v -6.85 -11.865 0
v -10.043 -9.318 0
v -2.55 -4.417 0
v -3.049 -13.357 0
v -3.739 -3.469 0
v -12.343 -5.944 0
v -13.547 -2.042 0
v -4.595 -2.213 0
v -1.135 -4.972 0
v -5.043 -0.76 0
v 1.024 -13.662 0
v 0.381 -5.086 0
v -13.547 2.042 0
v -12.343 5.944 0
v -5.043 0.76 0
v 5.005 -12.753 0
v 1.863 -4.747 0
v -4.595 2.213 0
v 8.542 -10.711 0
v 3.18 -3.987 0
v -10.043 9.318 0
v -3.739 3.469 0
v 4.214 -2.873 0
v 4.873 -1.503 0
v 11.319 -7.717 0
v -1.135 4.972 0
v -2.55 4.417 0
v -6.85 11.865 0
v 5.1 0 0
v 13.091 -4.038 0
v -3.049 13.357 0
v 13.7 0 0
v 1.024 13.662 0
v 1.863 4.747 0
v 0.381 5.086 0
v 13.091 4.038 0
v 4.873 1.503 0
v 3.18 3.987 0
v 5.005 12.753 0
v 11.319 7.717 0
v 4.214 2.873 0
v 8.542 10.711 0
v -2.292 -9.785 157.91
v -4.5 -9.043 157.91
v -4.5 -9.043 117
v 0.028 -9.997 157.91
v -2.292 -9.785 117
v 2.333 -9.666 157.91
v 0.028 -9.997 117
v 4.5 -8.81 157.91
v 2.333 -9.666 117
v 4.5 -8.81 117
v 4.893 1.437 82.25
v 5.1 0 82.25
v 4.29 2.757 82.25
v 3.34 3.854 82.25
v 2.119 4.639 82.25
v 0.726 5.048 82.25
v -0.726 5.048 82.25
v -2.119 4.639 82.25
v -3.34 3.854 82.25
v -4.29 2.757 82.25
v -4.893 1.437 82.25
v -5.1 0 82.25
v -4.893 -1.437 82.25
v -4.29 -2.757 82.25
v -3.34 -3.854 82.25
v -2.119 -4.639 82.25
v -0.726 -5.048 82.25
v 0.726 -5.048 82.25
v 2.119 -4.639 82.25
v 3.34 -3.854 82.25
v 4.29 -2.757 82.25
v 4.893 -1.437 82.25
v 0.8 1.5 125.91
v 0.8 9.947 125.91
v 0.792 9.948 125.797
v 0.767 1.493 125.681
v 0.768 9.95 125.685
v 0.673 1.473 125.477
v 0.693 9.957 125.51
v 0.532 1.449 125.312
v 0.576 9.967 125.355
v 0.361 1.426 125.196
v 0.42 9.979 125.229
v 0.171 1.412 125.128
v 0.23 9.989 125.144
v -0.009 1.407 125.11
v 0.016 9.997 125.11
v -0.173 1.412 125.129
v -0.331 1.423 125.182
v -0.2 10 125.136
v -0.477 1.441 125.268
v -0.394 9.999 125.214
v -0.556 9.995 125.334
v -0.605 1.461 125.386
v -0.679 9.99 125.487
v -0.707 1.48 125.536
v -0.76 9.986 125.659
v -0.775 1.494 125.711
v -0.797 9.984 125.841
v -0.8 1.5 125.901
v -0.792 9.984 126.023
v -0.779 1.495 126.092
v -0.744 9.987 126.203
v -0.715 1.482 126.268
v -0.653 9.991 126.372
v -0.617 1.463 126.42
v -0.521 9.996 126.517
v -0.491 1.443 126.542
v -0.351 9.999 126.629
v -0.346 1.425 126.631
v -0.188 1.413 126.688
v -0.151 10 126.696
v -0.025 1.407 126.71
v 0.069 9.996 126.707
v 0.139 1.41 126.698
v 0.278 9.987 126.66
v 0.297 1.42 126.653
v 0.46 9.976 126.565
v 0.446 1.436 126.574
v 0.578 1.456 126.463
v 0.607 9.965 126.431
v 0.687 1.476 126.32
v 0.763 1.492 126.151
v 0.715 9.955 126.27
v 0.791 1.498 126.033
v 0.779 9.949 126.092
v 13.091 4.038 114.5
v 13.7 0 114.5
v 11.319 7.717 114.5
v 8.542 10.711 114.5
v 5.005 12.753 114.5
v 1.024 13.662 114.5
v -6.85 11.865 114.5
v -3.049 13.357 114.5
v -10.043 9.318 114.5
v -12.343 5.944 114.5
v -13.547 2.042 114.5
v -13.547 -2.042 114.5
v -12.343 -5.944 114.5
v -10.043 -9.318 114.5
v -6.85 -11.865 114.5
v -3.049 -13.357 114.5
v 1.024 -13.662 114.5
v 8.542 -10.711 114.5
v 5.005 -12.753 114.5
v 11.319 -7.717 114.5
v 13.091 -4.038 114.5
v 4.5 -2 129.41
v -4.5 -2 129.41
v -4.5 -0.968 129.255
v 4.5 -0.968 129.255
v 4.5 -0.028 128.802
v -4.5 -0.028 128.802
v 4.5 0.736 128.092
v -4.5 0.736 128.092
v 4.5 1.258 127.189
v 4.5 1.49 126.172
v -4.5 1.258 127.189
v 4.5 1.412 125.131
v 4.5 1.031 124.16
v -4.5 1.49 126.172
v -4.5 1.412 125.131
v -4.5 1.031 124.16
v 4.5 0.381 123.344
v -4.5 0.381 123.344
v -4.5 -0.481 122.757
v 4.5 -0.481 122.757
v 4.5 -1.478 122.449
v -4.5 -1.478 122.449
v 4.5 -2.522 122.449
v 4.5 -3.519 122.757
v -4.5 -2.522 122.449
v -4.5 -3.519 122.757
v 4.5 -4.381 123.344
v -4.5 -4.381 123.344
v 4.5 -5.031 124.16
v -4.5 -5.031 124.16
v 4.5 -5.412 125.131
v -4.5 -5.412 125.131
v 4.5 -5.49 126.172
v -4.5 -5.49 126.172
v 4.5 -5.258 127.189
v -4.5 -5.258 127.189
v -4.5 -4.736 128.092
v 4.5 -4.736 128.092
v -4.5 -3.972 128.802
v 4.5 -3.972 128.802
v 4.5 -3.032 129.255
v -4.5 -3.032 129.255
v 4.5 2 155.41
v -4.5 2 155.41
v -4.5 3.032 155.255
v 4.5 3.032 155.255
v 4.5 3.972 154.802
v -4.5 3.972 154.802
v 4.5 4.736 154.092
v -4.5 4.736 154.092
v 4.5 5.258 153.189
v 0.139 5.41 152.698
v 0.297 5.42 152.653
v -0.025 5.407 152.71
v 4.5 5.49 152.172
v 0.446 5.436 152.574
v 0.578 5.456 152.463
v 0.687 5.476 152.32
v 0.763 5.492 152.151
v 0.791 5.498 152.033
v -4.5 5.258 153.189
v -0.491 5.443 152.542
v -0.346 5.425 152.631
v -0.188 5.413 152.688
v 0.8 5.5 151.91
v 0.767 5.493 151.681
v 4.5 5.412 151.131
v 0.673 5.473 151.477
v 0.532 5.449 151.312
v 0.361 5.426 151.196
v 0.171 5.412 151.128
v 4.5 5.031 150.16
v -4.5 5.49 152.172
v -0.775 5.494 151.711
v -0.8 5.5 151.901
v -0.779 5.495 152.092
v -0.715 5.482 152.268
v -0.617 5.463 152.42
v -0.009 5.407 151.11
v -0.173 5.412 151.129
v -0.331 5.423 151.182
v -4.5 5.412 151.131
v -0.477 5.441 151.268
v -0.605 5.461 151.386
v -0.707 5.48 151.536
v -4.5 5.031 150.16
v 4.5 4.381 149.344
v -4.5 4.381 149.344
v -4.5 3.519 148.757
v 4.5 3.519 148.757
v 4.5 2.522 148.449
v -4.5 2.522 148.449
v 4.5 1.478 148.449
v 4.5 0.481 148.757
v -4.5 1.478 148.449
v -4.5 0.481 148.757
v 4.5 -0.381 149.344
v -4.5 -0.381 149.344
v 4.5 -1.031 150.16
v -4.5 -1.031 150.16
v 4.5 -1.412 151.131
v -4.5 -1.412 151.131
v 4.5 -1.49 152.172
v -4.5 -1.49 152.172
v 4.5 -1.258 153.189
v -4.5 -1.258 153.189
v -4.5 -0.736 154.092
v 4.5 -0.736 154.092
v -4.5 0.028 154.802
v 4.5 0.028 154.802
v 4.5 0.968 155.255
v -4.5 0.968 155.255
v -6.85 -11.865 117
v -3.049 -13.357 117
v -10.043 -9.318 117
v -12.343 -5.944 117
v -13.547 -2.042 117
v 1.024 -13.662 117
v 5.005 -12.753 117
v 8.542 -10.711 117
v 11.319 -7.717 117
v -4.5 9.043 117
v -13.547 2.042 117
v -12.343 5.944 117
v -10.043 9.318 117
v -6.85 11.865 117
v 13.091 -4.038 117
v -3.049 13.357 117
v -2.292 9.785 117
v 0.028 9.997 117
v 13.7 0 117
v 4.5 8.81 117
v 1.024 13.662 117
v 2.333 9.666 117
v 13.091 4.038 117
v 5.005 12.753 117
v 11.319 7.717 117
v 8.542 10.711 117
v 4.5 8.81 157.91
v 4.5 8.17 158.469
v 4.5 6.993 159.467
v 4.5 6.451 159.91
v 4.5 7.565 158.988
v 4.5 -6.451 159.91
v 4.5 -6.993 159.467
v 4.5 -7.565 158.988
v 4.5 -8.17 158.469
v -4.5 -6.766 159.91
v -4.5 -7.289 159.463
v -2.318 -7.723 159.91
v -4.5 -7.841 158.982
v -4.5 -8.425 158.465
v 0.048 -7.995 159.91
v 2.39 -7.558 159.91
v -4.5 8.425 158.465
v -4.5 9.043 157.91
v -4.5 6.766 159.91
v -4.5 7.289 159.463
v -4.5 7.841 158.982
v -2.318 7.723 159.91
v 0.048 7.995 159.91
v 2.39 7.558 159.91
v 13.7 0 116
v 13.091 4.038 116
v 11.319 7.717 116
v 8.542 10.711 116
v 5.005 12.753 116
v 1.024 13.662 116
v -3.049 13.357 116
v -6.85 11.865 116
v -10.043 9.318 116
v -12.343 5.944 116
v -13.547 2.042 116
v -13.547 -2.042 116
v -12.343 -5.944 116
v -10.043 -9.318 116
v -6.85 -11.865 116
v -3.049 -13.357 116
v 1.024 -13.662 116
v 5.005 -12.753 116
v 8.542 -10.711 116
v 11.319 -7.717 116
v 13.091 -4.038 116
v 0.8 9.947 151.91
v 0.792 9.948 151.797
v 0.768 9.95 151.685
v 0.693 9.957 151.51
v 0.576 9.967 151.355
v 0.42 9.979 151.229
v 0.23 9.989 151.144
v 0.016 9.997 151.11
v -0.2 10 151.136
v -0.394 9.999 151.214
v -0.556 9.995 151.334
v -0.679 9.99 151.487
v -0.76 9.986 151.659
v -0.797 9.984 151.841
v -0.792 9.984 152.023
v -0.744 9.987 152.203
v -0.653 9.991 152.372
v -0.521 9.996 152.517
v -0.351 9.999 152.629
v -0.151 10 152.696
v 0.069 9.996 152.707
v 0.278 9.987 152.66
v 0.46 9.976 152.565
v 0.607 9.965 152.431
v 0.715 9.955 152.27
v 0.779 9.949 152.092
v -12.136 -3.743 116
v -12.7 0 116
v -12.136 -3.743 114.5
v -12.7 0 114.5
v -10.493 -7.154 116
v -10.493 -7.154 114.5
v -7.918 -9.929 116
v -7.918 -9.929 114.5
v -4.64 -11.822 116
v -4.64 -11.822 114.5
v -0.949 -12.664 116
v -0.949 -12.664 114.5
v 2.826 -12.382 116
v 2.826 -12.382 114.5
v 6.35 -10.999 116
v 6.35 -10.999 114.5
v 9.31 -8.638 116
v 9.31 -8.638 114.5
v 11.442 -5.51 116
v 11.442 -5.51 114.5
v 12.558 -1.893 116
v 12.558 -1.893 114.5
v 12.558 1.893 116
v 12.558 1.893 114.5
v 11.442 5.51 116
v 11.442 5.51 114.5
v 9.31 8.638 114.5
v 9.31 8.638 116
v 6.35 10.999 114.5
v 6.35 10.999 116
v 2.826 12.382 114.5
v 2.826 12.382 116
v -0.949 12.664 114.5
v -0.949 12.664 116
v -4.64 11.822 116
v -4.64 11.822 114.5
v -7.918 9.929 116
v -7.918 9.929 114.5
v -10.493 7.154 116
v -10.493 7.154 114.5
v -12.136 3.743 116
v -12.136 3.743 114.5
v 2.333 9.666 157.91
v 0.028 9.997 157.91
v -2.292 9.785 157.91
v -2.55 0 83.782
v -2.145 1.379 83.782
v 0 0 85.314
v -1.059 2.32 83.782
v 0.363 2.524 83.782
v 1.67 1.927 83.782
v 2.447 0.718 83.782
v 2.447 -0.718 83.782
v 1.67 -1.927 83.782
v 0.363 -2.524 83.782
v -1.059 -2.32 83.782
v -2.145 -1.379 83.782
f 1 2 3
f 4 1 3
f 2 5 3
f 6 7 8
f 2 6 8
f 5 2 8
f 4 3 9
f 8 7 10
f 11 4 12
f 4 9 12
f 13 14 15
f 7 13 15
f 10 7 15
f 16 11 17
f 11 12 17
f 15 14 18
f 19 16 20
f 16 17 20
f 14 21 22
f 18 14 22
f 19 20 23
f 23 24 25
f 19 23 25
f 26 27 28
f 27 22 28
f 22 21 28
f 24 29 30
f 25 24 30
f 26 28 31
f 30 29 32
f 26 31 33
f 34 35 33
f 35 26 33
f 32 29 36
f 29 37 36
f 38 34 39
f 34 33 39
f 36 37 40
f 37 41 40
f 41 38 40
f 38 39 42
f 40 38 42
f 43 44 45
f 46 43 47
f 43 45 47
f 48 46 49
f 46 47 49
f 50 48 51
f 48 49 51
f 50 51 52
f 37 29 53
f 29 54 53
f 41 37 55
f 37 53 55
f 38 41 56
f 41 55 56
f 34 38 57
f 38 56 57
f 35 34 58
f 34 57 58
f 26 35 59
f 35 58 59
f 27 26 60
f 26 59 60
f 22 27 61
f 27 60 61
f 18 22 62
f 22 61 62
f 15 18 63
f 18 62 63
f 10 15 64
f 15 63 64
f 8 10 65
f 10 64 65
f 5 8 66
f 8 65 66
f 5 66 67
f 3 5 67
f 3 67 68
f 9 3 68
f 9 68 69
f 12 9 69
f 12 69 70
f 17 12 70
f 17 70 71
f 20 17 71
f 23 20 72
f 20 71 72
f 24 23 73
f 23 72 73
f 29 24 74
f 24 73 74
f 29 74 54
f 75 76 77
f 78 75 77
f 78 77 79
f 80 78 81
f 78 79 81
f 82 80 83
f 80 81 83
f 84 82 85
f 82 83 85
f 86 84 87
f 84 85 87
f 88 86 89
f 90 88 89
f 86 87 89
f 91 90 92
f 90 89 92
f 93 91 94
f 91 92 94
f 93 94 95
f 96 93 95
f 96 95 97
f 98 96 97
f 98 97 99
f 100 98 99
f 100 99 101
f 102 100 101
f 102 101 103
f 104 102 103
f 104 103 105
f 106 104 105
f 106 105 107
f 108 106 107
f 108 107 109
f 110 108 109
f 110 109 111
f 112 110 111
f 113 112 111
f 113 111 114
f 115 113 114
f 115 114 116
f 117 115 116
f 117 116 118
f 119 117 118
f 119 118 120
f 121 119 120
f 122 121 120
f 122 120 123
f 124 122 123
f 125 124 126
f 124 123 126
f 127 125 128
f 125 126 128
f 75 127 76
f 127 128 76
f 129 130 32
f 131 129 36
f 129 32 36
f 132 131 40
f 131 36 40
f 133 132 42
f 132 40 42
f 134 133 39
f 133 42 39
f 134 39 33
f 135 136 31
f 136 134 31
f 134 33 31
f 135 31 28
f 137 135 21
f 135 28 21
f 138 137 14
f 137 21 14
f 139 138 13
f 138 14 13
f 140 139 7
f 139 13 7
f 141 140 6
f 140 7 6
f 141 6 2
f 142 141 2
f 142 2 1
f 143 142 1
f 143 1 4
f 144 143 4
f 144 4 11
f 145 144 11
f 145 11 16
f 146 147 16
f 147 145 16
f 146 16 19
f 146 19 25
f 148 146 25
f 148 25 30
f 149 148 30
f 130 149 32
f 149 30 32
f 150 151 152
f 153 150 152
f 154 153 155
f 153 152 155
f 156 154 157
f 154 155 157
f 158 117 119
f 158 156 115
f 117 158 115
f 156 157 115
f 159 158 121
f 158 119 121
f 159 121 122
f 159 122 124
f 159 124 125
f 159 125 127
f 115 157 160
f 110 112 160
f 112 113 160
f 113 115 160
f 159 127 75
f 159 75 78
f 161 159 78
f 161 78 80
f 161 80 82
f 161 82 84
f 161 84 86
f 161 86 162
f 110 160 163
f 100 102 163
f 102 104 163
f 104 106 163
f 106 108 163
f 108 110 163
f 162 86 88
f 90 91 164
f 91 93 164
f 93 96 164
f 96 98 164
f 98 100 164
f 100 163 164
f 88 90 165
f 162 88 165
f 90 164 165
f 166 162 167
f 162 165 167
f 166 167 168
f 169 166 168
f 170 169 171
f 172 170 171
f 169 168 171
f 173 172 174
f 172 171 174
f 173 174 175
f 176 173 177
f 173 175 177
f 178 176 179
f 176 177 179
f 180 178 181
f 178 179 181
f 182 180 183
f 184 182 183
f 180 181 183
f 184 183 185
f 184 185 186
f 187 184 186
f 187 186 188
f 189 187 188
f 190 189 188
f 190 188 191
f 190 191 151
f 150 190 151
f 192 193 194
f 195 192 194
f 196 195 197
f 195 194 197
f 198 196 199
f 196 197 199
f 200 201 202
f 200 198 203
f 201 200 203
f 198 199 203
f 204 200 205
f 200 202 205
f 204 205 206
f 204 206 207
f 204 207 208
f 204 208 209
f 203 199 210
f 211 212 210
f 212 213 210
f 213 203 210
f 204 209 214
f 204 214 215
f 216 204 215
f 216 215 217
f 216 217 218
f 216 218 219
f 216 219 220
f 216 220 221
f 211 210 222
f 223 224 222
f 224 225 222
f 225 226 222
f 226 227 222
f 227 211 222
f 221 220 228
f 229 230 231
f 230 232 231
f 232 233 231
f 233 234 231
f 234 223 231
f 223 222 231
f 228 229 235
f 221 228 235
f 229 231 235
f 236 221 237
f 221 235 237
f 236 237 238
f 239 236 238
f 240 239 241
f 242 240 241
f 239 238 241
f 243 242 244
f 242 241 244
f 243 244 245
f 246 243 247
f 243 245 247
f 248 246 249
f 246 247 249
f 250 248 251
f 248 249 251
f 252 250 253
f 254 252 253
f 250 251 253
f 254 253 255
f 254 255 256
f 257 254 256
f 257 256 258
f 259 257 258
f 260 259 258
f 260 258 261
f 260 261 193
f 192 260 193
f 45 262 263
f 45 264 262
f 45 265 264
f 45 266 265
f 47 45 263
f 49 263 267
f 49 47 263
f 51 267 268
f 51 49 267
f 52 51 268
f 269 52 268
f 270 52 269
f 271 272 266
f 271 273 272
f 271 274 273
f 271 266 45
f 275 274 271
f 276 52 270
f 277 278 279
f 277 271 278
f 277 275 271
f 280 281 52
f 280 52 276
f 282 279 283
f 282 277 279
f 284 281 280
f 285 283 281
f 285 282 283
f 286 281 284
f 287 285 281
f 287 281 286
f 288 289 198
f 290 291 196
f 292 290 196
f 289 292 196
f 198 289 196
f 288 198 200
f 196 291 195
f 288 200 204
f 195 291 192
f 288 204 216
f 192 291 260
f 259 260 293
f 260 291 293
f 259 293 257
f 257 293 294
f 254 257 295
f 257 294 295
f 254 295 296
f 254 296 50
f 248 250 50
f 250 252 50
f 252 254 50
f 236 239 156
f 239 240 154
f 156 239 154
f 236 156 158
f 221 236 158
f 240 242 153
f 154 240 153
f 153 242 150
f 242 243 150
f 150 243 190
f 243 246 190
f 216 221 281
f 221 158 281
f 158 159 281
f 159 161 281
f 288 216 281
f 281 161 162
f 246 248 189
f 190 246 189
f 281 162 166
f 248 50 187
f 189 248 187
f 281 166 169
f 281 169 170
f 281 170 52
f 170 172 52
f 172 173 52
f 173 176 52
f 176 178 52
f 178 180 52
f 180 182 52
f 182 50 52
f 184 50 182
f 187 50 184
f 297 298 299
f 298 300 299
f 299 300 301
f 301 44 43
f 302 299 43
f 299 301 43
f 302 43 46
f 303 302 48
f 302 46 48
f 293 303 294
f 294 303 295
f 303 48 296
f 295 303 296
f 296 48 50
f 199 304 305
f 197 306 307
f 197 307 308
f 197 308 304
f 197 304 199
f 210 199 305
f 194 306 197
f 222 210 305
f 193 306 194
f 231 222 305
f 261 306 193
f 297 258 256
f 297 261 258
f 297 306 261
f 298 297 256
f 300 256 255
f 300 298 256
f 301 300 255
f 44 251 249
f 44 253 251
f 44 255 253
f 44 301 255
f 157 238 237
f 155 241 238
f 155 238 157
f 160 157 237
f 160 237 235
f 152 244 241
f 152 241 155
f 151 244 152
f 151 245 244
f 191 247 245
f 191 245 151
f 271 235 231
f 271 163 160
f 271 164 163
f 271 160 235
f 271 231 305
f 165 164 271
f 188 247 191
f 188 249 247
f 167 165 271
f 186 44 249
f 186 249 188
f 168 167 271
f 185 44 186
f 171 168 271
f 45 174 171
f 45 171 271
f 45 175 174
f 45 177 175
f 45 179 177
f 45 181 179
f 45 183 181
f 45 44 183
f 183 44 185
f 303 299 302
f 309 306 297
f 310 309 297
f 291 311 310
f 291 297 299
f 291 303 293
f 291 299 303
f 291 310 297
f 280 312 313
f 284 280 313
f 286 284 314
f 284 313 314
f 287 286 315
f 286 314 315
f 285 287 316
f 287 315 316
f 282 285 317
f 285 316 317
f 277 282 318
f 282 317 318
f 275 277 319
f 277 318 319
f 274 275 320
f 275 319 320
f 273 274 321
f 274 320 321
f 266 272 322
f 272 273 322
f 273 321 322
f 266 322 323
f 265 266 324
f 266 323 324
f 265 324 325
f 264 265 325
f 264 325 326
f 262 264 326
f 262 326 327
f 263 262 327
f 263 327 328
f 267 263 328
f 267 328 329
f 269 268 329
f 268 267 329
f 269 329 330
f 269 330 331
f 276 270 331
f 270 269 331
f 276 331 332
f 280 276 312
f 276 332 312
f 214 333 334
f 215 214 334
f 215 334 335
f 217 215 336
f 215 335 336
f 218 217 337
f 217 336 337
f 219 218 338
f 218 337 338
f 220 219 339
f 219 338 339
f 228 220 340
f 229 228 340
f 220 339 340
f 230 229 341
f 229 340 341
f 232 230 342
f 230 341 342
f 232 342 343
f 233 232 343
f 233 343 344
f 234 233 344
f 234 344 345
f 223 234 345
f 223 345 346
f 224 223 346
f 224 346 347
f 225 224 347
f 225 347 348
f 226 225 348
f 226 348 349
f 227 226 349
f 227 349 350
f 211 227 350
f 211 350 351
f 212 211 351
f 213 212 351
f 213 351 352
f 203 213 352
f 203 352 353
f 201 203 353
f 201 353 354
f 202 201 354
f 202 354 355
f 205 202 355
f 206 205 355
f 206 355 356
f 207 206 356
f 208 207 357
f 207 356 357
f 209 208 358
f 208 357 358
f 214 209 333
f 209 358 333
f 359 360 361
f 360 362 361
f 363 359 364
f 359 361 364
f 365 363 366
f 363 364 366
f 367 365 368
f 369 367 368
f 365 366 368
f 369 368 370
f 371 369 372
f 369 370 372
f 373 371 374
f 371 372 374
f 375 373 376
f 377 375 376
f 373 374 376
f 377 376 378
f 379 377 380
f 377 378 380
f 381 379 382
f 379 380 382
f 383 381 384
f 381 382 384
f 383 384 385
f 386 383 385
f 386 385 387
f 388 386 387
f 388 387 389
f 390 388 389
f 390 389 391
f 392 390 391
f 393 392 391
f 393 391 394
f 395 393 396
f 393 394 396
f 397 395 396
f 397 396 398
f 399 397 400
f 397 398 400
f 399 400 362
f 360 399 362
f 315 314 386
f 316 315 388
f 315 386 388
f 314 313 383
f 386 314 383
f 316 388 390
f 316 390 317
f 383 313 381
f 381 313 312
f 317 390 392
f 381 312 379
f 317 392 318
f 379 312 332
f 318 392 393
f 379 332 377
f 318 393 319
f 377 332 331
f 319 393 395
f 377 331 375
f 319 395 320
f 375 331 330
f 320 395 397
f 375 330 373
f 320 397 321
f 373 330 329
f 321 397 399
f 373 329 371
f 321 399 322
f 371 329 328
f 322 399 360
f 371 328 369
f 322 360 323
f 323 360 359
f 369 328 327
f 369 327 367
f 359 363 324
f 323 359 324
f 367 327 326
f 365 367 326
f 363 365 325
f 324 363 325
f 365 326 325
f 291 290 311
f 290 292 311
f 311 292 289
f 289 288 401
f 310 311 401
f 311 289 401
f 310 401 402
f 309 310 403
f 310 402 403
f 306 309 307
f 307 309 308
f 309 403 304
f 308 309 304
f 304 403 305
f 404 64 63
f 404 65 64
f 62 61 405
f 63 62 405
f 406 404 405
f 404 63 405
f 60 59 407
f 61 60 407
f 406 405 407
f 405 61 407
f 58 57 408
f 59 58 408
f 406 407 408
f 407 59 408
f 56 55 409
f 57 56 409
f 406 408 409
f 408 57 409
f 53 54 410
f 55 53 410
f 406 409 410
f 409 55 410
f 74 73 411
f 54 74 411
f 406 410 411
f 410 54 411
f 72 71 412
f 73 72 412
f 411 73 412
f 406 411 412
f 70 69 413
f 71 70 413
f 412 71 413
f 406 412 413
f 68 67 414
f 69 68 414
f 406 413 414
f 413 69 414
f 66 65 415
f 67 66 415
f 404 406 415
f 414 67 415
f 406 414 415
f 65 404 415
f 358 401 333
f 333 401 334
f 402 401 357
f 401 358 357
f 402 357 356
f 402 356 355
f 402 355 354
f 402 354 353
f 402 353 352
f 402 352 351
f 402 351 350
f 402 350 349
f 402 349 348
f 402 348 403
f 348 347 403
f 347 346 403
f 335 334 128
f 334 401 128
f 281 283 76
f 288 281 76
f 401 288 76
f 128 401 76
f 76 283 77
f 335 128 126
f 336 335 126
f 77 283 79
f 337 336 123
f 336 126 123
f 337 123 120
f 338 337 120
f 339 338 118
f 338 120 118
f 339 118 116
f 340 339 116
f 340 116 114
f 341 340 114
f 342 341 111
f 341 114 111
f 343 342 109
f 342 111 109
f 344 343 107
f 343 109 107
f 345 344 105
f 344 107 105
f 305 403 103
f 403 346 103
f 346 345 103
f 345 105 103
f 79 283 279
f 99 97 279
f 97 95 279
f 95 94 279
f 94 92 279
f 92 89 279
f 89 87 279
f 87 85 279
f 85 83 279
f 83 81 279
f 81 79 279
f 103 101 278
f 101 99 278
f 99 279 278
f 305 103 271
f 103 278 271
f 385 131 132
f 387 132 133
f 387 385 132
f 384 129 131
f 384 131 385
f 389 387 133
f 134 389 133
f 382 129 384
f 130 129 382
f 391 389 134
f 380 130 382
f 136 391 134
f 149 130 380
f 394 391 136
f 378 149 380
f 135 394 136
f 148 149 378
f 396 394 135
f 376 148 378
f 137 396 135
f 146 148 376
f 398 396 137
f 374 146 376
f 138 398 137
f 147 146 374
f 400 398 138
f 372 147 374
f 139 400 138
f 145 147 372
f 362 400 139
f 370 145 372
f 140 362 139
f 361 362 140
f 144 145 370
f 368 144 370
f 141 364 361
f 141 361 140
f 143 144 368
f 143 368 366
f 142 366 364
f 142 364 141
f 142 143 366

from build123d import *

# Parameters (mm, degrees)
SKETCH_1_R               = 13.7
EXTRUDE_1_DEPTH          = 117
SKETCH_6_W               = 1
SKETCH_6_H               = 1.5
HOLE_WIZARD_M12_1_D      = 10.2
HOLE_WIZARD_M12_1_DEPTH  = 82.25
HOLE_WIZARD_M12_1_TIP    = 3.064389157
SKETCH_9_R               = 10
EXTRUDE_3_DEPTH          = 42.91
CUT_EXTRUDE_1_DEPTH      = 162.079446547
CUT_EXTRUDE_1_DEPTH_BACK = 162.079446547
SKETCH_8_W               = 42.91
SKETCH_8_H               = 10.443945465
CHAMFER_1_SIZE           = 2
HOLE_WIZARD_7_0_7_1_D    = 7
HOLE_WIZARD_M2_1_REACH   = 164.236
HOLE_WIZARD_M2_1_BORE_R  = 0.8


with BuildPart() as part:
    # 草图1 → 凸台-拉伸1 (new body)
    with BuildSketch(Plane.XY):
        Circle(SKETCH_1_R)
    extrude(amount=EXTRUDE_1_DEPTH)

    # 草图6 → 切除-旋转1 (revolve, cut)
    with BuildSketch(Plane(origin=(0, 0, 0), x_dir=(1, 0, 0), z_dir=(0, 1, 0))):
        with Locations((-13.2, -115.25)):
            Rectangle(SKETCH_6_W, SKETCH_6_H)
    revolve(axis=Axis((0, 0, 0), (0, 0, 1)), mode=Mode.SUBTRACT)

    # M12 螺纹孔1
    with Locations(Plane(origin=(0, 0, 0), x_dir=(-1, 0, 0), z_dir=(0, 0, -1))):
        with Locations((0, 0)):
            Hole(HOLE_WIZARD_M12_1_D / 2, depth=HOLE_WIZARD_M12_1_DEPTH)
            with Locations((0, 0, -(HOLE_WIZARD_M12_1_DEPTH + HOLE_WIZARD_M12_1_TIP / 2))):  # 118° drill point
                Cone(0, HOLE_WIZARD_M12_1_D / 2, HOLE_WIZARD_M12_1_TIP, mode=Mode.SUBTRACT)

    # 草图9 → 凸台-拉伸3 (add)
    with BuildSketch(Plane.XY.offset(117)):
        with Locations((-0.231058247, 0)):
            Circle(SKETCH_9_R)
    extrude(amount=EXTRUDE_3_DEPTH)

    # 草图8 → 切除-拉伸1 (cut, two sides: drawn at the far end of the back side and taken through both)
    with BuildSketch(Plane(origin=(0, 0, 0), x_dir=(0, 0, -1), z_dir=(0, 1, 0)).offset(-CUT_EXTRUDE_1_DEPTH_BACK)):
        with Locations((-138.455, 9.721972732)):
            Rectangle(SKETCH_8_W, SKETCH_8_H)
        with Locations((-138.455, -9.721972732)):
            Rectangle(SKETCH_8_W, SKETCH_8_H)
    extrude(amount=CUT_EXTRUDE_1_DEPTH + CUT_EXTRUDE_1_DEPTH_BACK, mode=Mode.SUBTRACT)

    # 倒角1
    chamfer_1_edges = [part.edges().sort_by_distance(p)[0] for p in [
        (0.027699329, -9.996651665, 159.91),
        (0.027699329, 9.996651665, 159.91),
    ]]
    chamfer(chamfer_1_edges, length=CHAMFER_1_SIZE)

    # Ø7.0 (7) 直径孔1 (through all)
    with Locations(Plane(origin=(4.5, 0, 0), x_dir=(0, 0, -1), z_dir=(1, 0, 0))):
        with Locations((-125.91, -2), (-151.91, 2)):
            Hole(HOLE_WIZARD_7_0_7_1_D / 2)

    # M2 螺纹孔1 bore → M2 螺纹孔1 (cut, up to next)
    with BuildSketch(Plane(origin=(0, 10, 0), x_dir=(1, 0, 0), z_dir=(0, 1, 0)), mode=Mode.PRIVATE) as hole_wizard_m2_1_sk1:
        with Locations((0, -151.91)):
            Circle(HOLE_WIZARD_M2_1_BORE_R)
    hole_wizard_m2_1_tool1 = extrude(hole_wizard_m2_1_sk1.sketch, amount=-HOLE_WIZARD_M2_1_REACH, mode=Mode.PRIVATE) & part.part
    # M2 螺纹孔1 bore → M2 螺纹孔1 (cut, up to next)
    with BuildSketch(Plane(origin=(0, 10, 0), x_dir=(1, 0, 0), z_dir=(0, 1, 0)), mode=Mode.PRIVATE) as hole_wizard_m2_1_sk2:
        with Locations((0, -125.91)):
            Circle(HOLE_WIZARD_M2_1_BORE_R)
    hole_wizard_m2_1_tool2 = extrude(hole_wizard_m2_1_sk2.sketch, amount=-HOLE_WIZARD_M2_1_REACH, mode=Mode.PRIVATE) & part.part
    add(hole_wizard_m2_1_tool1.solids().sort_by_distance((0, 10, 151.91))[0], mode=Mode.SUBTRACT)
    add(hole_wizard_m2_1_tool2.solids().sort_by_distance((0, 10, 125.91))[0], mode=Mode.SUBTRACT)


solid = part.part
